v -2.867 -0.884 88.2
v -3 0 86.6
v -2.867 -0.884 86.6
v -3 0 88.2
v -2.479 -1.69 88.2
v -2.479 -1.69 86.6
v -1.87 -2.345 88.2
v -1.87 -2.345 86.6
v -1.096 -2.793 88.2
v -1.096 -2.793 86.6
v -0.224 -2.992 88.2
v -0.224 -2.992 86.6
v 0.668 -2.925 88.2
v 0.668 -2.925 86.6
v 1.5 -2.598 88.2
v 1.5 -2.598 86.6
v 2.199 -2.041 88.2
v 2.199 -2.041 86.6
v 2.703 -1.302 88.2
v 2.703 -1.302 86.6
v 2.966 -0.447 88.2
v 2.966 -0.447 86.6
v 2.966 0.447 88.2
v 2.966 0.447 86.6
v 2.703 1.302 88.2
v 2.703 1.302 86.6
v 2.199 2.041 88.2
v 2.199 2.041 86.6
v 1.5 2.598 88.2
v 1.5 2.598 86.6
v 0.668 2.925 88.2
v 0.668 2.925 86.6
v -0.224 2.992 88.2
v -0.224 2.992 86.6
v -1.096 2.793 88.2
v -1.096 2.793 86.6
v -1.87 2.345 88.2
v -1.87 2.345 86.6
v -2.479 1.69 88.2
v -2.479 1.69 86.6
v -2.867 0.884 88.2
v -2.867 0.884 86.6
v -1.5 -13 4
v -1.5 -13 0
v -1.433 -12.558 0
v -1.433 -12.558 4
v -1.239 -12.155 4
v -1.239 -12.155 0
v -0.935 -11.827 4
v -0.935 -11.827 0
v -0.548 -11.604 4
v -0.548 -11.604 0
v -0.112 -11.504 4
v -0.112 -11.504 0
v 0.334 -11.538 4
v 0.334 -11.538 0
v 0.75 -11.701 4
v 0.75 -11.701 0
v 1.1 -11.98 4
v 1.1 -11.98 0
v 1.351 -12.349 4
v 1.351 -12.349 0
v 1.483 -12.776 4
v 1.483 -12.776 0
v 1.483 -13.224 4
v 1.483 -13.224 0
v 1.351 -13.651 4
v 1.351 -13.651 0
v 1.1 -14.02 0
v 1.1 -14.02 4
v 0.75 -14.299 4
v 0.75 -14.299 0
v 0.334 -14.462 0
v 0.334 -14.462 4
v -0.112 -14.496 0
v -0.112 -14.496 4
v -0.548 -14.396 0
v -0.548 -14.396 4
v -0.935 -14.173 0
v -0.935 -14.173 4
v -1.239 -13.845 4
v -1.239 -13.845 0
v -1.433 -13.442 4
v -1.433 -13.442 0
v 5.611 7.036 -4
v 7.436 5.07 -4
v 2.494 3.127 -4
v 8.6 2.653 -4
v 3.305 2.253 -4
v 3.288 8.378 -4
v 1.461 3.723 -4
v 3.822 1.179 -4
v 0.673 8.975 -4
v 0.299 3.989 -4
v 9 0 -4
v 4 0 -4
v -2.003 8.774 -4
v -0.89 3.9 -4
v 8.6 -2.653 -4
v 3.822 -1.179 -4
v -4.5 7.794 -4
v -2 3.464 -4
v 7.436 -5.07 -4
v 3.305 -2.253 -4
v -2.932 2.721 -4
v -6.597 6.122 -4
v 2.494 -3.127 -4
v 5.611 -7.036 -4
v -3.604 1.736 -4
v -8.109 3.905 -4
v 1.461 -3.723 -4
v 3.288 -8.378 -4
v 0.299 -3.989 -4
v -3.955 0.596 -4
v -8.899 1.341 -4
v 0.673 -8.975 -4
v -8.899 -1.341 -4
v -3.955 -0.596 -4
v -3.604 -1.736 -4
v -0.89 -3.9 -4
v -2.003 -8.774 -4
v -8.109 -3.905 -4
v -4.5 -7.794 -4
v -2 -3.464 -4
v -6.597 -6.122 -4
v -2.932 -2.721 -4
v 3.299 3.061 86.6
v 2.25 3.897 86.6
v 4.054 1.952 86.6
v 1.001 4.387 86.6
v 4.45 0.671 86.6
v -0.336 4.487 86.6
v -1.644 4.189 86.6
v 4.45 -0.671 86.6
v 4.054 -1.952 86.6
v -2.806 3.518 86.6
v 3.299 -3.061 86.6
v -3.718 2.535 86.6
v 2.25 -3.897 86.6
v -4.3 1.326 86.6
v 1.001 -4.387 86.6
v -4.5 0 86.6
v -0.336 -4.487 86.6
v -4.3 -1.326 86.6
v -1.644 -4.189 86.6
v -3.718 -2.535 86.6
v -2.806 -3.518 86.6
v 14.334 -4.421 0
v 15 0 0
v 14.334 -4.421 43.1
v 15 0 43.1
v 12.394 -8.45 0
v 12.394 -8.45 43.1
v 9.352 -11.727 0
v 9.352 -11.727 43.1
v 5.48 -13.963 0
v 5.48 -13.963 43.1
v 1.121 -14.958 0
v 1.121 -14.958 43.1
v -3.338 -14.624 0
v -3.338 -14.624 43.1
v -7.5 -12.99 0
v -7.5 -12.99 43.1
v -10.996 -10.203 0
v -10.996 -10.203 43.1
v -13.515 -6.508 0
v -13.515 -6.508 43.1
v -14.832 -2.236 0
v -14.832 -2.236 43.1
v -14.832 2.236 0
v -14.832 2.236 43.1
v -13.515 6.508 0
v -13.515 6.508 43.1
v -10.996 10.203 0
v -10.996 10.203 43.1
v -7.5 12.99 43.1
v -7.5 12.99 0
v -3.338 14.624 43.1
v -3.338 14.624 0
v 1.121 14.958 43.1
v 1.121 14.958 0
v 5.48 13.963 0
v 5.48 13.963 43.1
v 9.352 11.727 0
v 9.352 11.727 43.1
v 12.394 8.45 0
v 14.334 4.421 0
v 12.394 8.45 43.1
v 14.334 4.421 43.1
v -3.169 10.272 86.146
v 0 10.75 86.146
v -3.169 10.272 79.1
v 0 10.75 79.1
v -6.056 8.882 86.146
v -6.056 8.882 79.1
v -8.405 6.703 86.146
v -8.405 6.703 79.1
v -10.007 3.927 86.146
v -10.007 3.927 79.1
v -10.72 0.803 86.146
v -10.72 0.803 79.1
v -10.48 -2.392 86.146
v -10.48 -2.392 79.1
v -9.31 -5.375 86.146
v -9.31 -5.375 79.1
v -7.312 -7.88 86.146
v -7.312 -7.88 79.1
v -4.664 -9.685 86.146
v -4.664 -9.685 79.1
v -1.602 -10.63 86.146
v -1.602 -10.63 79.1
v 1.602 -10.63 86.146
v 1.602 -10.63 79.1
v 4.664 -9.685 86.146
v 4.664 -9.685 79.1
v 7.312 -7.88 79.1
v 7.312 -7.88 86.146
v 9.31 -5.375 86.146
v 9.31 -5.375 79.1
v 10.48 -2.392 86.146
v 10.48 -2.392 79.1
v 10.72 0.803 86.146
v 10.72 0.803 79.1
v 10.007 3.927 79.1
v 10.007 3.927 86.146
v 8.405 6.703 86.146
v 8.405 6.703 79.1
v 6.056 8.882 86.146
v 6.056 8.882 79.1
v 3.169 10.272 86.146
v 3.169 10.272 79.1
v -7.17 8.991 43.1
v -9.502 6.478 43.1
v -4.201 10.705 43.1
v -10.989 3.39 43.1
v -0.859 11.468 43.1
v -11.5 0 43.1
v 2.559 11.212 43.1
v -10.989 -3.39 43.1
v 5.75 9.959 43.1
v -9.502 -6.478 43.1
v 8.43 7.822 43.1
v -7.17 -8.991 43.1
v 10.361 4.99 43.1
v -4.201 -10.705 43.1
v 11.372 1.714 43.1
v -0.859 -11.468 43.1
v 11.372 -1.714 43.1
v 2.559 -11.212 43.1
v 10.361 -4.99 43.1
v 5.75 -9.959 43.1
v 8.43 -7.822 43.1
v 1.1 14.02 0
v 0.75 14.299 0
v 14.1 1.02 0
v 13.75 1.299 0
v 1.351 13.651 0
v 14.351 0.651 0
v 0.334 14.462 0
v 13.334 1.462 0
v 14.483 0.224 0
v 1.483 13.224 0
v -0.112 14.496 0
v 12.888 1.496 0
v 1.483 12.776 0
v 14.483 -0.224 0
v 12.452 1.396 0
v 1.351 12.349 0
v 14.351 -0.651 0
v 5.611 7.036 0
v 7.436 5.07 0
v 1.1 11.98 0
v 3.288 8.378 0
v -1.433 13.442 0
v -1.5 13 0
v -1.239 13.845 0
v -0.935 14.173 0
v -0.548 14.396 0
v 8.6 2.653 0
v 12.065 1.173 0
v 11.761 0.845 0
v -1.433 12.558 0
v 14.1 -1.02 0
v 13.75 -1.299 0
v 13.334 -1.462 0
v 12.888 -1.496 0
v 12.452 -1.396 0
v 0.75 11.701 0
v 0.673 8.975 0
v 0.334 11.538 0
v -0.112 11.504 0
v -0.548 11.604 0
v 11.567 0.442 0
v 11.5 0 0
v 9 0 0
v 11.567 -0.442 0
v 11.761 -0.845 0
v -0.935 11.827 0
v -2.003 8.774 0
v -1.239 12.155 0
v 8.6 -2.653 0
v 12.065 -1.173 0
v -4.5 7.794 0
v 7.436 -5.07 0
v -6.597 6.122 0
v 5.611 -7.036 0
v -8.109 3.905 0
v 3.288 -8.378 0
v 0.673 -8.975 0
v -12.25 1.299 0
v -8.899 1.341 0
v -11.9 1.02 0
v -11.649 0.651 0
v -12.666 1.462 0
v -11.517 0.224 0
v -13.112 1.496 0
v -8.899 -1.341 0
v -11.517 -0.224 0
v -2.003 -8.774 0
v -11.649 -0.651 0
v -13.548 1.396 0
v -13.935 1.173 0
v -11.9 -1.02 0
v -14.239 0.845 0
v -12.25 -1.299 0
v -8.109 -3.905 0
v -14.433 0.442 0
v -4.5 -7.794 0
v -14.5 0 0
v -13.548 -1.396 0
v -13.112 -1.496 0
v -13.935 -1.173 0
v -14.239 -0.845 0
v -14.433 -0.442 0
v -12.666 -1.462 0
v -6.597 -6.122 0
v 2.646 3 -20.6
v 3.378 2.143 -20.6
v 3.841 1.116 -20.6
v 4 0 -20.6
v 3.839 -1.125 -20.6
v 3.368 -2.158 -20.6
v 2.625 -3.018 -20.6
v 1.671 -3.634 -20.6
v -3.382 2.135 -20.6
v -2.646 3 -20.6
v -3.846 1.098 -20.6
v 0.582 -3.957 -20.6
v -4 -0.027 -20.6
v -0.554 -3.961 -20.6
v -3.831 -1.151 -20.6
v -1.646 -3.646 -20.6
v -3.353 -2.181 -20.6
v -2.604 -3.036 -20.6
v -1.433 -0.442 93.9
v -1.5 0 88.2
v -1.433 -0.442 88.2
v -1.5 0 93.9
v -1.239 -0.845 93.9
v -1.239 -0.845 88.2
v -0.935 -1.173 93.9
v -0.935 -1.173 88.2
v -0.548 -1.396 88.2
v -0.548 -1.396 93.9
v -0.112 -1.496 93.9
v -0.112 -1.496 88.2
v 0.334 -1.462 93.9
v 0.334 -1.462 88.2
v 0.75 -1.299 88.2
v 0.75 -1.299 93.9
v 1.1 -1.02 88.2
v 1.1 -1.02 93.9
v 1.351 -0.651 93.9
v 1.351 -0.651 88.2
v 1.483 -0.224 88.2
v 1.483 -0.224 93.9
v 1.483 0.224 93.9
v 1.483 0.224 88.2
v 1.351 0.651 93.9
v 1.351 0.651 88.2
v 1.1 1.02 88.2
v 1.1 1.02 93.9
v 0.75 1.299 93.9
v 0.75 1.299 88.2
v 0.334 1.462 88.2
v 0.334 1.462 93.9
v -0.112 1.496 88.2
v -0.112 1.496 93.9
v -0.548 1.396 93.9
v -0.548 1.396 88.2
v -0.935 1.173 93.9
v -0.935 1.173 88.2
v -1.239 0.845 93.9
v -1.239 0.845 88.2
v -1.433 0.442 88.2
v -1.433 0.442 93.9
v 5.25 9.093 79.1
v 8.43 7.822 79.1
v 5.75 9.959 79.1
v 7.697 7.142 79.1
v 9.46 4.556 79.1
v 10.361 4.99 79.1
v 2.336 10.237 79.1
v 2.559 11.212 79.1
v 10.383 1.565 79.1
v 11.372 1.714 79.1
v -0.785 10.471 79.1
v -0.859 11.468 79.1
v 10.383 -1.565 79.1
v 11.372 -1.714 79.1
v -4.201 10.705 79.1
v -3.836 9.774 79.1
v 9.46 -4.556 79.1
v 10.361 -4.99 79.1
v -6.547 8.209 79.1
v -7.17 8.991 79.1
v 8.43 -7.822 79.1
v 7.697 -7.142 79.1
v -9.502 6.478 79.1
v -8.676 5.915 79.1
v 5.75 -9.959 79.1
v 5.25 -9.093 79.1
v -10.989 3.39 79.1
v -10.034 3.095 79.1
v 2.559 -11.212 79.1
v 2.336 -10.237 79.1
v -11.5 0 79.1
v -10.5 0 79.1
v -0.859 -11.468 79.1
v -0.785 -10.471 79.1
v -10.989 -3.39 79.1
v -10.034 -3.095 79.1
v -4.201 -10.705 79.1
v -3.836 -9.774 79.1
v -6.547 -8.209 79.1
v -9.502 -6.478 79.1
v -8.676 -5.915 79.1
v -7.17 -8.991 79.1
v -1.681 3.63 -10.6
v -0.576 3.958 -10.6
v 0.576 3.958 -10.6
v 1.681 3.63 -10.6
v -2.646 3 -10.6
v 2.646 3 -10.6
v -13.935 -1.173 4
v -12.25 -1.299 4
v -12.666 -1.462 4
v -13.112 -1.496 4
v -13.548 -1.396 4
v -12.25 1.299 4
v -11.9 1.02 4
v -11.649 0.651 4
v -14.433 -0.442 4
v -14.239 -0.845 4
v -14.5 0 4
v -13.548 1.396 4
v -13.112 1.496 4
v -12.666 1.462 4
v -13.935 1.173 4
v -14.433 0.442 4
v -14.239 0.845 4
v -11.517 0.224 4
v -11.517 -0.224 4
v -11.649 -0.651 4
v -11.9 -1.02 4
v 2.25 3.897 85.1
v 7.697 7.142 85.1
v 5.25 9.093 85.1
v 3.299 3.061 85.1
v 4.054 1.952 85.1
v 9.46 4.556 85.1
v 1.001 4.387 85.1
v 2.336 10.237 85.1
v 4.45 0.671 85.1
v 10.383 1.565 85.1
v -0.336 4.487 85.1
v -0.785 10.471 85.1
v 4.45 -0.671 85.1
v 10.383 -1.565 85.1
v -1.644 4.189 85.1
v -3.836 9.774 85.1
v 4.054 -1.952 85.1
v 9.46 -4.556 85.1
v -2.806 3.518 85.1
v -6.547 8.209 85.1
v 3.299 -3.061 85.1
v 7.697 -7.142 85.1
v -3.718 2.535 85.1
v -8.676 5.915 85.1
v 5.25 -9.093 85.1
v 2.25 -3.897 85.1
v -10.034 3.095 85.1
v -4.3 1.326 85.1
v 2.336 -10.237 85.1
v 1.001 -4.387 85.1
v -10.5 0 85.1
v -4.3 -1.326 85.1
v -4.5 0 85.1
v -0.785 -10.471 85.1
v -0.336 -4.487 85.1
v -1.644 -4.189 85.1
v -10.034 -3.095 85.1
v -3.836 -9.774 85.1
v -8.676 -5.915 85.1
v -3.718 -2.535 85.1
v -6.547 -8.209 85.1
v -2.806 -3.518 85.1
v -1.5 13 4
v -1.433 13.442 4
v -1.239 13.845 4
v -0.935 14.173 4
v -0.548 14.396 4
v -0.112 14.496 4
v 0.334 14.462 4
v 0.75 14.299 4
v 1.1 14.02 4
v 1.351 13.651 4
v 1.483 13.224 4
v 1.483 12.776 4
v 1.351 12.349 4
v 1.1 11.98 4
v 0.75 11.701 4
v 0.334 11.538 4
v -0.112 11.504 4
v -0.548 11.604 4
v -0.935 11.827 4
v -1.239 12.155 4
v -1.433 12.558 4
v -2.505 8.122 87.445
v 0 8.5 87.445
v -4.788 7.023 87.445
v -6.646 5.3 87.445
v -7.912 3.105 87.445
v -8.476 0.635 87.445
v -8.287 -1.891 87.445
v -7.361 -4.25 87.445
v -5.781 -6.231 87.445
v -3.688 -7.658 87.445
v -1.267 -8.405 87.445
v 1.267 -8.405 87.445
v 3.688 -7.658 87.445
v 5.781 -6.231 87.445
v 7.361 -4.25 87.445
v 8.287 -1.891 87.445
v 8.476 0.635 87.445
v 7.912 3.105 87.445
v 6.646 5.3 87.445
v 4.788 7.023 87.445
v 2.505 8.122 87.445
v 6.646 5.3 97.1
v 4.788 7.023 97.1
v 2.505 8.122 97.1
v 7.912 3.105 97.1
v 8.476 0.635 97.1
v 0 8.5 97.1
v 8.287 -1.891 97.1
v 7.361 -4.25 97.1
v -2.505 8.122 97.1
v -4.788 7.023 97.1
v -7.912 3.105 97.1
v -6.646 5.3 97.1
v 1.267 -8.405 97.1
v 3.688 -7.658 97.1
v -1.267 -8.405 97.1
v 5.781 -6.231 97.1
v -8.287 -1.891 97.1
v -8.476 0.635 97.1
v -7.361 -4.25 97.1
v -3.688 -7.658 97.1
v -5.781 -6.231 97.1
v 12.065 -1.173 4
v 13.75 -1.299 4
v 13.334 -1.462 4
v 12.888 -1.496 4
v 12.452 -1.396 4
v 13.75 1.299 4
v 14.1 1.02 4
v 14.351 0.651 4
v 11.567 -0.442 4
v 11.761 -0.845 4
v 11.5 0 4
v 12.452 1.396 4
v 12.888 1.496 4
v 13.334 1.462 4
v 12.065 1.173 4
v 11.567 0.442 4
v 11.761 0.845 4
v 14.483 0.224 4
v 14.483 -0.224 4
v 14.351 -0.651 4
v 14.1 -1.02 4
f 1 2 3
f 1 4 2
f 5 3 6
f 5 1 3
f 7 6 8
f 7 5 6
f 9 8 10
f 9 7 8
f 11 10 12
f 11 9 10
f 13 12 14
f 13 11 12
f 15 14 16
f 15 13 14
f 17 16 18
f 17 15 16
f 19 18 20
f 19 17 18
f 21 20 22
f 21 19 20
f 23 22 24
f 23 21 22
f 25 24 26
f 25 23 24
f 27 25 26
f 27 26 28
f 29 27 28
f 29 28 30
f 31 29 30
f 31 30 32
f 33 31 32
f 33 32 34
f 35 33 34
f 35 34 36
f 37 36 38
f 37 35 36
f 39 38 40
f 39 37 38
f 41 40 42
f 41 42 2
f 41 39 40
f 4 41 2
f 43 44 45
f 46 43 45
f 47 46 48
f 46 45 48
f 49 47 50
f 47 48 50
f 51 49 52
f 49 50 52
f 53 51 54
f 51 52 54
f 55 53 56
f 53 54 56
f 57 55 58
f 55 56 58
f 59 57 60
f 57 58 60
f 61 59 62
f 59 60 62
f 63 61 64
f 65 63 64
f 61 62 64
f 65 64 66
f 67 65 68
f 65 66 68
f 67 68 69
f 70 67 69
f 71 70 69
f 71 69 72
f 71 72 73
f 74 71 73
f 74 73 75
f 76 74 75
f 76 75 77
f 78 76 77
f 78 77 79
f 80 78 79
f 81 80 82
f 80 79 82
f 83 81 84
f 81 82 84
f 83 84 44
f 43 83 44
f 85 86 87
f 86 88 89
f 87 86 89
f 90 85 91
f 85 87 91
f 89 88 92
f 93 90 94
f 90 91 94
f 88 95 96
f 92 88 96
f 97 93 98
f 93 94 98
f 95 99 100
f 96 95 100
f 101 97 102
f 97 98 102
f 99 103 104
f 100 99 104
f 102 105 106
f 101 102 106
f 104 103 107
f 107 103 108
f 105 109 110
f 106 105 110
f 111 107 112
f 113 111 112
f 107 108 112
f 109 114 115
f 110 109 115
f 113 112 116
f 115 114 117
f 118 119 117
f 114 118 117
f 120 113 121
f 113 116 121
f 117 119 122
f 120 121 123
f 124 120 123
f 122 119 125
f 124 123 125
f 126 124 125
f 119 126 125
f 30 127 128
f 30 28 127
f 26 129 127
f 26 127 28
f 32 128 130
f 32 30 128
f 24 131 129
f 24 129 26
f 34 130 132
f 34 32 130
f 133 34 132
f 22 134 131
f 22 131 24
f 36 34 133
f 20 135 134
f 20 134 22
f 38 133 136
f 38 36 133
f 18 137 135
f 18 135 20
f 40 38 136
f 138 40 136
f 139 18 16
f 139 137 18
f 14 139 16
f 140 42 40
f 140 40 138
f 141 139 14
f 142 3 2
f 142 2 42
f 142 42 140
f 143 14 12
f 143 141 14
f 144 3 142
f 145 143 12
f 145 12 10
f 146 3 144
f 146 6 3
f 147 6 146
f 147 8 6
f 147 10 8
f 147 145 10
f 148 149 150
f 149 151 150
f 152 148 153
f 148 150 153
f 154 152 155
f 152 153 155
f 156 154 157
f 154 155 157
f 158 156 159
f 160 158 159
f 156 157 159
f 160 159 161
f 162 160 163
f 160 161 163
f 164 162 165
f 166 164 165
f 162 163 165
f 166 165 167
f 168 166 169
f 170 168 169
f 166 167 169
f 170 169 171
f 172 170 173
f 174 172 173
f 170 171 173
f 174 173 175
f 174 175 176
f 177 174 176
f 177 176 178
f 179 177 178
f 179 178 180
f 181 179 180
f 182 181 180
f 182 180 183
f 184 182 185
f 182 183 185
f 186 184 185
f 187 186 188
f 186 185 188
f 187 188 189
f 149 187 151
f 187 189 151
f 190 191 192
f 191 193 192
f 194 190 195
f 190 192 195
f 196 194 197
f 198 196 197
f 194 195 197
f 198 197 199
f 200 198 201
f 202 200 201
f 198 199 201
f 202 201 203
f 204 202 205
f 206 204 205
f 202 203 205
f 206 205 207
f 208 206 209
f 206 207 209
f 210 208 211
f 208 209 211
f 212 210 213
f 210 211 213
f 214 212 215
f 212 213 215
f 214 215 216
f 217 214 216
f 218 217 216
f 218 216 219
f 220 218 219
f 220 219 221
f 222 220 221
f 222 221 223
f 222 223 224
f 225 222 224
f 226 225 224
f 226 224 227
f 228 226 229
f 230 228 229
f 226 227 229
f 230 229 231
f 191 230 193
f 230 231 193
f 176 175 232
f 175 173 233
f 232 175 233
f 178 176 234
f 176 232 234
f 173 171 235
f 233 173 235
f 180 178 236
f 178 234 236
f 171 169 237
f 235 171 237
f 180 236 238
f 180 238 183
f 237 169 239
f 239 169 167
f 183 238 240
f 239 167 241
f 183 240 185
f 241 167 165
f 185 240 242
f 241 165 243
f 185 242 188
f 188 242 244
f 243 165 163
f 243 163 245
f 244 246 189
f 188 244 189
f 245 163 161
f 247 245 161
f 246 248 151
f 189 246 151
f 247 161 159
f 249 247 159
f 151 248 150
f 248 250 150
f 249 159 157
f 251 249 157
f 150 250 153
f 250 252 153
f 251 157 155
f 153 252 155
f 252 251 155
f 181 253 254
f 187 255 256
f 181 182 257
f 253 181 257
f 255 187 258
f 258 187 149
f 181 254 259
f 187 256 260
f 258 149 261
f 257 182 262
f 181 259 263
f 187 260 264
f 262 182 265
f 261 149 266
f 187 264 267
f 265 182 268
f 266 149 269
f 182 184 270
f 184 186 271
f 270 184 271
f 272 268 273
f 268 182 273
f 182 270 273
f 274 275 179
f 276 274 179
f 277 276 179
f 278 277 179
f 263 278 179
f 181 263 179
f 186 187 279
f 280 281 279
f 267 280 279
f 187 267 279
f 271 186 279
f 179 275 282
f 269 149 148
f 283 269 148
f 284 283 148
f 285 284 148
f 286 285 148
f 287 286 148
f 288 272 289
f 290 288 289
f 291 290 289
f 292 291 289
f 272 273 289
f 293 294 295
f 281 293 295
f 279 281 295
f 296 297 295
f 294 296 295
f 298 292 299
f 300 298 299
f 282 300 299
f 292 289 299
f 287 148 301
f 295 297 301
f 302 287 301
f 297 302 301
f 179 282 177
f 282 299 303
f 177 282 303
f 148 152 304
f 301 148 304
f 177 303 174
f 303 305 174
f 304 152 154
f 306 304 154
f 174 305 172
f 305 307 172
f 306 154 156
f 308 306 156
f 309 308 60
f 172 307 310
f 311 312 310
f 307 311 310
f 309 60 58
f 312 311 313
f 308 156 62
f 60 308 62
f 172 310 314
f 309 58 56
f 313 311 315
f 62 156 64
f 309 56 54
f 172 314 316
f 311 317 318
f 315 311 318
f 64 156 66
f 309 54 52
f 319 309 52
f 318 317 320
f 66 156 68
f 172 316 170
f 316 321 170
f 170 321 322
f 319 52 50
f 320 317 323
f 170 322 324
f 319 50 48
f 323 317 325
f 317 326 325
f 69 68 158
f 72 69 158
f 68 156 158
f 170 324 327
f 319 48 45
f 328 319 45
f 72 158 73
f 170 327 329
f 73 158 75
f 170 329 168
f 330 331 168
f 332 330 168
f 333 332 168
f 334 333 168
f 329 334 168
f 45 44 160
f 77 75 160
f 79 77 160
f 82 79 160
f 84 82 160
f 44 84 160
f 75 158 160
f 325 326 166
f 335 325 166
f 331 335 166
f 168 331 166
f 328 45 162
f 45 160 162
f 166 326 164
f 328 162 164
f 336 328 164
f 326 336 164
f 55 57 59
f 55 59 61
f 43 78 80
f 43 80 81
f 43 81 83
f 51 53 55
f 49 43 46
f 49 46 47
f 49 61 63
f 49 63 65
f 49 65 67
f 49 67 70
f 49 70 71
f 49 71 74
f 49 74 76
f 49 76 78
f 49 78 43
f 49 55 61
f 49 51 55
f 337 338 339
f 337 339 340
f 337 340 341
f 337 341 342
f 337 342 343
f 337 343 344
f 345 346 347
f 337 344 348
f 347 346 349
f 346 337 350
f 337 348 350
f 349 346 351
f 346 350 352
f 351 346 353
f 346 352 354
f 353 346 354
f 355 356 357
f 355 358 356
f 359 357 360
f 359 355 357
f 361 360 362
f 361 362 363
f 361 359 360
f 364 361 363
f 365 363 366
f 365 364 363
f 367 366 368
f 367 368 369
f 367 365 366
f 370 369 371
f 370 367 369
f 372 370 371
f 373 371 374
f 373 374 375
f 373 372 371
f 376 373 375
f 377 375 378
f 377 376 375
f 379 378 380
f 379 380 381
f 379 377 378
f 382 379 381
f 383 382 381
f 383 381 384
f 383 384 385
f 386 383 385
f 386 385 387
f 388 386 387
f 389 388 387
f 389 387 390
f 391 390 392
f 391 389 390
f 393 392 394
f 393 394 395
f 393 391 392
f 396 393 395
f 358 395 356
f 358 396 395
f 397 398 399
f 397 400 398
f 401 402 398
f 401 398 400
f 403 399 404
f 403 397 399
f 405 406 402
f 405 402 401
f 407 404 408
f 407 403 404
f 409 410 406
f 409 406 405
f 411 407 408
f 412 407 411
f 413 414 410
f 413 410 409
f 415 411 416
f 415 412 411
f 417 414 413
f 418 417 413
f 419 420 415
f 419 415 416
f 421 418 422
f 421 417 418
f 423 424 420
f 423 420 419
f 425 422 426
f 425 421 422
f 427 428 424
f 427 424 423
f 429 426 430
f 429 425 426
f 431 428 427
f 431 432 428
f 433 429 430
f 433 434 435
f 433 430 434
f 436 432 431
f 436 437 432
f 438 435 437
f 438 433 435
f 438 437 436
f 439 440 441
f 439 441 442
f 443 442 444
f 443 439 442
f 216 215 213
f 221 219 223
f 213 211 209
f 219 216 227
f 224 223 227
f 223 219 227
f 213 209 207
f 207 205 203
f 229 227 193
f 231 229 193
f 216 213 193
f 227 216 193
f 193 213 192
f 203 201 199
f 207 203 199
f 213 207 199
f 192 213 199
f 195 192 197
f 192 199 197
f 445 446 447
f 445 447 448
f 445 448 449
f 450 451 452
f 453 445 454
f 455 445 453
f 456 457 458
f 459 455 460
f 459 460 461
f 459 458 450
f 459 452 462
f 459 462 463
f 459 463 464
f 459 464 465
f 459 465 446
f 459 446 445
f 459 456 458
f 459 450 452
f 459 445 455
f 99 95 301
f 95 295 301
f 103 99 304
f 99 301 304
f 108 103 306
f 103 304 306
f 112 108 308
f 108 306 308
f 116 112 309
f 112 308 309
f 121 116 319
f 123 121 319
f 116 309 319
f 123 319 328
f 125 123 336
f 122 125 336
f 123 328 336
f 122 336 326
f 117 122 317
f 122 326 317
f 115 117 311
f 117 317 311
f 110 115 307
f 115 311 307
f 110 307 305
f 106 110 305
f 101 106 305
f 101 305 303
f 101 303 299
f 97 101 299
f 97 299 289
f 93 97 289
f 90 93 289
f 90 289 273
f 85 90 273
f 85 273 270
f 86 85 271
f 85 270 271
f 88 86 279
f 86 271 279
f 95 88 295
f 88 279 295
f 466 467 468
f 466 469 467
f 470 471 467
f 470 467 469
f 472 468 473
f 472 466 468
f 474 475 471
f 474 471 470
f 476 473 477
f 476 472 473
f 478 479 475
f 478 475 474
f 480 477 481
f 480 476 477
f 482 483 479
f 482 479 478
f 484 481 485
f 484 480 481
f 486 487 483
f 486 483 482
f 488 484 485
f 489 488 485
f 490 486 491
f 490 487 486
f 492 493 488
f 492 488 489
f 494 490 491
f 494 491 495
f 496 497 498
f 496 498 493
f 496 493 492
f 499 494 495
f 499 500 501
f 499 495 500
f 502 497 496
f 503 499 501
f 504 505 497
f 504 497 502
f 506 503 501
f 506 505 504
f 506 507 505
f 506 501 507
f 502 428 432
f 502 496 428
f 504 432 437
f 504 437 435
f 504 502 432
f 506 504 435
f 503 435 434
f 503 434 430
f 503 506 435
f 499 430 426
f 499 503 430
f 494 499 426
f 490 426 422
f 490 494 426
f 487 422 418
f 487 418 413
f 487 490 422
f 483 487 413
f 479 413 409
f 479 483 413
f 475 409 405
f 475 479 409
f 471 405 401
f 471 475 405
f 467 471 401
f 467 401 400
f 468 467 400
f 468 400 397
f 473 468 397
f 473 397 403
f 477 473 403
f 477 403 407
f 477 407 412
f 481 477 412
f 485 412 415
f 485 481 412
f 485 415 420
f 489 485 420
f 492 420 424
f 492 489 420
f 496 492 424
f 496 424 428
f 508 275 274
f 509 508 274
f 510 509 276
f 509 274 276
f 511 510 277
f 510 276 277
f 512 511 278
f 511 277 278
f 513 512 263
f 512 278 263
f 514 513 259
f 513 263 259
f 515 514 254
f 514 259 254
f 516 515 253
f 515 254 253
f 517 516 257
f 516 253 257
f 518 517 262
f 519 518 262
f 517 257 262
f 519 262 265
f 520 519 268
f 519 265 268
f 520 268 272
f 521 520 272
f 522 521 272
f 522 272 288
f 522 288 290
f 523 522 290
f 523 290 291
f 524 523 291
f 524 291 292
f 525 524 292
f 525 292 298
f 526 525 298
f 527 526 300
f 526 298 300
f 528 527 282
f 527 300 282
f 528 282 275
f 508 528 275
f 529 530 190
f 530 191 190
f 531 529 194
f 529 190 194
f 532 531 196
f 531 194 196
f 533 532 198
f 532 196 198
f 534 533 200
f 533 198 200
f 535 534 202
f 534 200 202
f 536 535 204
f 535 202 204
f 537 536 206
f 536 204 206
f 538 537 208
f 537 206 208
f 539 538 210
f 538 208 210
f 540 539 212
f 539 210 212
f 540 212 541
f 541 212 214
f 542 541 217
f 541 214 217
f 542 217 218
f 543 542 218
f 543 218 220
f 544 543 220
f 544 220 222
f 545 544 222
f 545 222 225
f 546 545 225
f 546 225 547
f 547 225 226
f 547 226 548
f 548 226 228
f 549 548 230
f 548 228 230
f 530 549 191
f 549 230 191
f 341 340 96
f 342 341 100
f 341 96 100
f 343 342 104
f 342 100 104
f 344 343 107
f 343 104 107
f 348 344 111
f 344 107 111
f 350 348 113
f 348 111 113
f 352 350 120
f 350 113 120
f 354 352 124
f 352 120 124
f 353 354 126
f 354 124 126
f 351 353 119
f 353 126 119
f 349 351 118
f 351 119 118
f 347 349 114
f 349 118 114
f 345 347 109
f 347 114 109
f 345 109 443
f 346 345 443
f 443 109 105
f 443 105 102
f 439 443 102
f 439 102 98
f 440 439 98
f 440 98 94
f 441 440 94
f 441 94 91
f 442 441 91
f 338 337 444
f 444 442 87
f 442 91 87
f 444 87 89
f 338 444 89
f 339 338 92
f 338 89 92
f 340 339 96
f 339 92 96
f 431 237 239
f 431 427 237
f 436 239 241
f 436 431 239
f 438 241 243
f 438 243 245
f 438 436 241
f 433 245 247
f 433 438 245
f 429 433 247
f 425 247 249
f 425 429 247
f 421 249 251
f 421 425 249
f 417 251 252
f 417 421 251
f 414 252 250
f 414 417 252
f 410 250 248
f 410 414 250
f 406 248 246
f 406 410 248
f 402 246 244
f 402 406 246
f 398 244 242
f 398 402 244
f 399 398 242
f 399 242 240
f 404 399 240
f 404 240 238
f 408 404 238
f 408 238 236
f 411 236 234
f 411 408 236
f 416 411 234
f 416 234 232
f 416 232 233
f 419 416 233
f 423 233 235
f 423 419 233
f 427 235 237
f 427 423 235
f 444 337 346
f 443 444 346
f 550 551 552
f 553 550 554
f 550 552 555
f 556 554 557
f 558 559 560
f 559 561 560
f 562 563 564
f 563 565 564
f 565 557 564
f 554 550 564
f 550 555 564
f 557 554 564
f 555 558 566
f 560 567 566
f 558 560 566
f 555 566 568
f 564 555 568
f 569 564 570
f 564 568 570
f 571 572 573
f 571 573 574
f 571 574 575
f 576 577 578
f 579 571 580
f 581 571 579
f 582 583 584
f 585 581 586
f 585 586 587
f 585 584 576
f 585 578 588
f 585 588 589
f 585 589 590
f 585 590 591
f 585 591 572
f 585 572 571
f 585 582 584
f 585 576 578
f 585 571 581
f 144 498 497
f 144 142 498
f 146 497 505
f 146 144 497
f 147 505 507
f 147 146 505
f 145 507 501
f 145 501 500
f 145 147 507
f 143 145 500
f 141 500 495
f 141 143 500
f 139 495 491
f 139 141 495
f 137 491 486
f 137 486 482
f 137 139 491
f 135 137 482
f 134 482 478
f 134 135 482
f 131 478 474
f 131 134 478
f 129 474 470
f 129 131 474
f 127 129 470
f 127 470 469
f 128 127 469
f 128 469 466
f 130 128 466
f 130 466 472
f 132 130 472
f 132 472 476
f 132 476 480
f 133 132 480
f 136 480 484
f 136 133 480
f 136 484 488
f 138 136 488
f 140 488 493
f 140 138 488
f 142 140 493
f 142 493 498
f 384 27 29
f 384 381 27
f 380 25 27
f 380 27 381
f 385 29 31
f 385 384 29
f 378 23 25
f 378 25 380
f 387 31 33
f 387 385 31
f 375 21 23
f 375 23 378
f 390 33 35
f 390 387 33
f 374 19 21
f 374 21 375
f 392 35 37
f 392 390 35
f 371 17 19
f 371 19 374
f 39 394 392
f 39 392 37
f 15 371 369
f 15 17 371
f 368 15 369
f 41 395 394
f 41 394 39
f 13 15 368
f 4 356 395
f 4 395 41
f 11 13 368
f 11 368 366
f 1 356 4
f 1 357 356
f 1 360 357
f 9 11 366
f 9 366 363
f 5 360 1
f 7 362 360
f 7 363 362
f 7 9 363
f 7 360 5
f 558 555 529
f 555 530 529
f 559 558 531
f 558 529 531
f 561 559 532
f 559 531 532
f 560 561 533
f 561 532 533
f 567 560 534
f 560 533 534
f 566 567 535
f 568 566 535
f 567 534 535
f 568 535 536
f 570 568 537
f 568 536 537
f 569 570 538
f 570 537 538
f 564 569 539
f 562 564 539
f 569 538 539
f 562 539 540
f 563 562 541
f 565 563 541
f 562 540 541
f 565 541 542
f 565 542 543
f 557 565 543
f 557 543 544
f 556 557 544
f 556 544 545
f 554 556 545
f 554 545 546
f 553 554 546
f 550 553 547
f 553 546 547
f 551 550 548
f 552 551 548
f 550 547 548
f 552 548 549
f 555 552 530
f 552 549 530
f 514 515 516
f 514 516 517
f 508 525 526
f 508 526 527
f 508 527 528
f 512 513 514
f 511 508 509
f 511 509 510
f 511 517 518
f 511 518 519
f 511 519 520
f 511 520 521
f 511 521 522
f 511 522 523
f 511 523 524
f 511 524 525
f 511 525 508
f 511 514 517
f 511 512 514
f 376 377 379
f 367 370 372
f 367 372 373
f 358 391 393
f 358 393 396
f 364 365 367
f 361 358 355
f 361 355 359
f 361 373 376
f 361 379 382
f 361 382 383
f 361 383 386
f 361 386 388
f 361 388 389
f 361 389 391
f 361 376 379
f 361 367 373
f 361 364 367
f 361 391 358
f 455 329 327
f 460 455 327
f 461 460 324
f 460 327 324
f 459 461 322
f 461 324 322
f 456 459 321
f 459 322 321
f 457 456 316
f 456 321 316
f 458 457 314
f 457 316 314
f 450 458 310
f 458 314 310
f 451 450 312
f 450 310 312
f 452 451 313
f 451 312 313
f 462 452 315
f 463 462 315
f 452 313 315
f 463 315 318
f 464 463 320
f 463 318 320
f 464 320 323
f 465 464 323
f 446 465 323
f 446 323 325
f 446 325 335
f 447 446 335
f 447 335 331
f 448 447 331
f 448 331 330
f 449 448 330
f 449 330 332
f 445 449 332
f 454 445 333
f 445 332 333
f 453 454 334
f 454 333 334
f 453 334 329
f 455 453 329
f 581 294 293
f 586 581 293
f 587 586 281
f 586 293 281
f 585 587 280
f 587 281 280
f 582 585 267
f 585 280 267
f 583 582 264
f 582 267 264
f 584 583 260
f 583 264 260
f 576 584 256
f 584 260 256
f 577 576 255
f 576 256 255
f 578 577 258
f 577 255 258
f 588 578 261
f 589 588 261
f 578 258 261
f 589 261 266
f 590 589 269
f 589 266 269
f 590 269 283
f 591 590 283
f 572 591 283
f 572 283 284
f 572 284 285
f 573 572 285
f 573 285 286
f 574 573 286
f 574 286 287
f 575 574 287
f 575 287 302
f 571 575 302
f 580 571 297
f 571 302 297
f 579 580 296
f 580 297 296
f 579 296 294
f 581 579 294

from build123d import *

# Parameters (mm, degrees)
CUT_EXTRUDE1_START = -10
CUT_EXTRUDE1_DEPTH = 10
SKETCH5_R          = 1.5
CUT_EXTRUDE2_DEPTH = 4


with BuildPart() as part:
    # Sketch1 → Revolve1 (revolve)
    with BuildSketch(Plane(origin=(0, 0, 0), x_dir=(0, 0, -1), z_dir=(1, 0, 0)), mode=Mode.PRIVATE) as revolve1_sk:
        Polygon((20.6, 0), (20.6, 4), (4, 4), (4, 9), (0, 9), (0, 15), (-43.1, 15), (-43.1, 0), align=None)
    revolve(revolve1_sk.sketch.rotate(Axis((0, 0, 0), (0, 0, -1)), 90), axis=Axis((0, 0, 0), (0, 0, -1)))

    # Sketch2 → Cut-Extrude1 (cut)
    with BuildSketch(Plane(origin=(0, 0, -20.6), x_dir=(-1, 0, 0), z_dir=(0, 0, -1)).offset(CUT_EXTRUDE1_START)):
        with BuildLine():
            Line((-2.645751311, 3), (2.645751311, 3))
            ThreePointArc((2.645751311, 3), (0, 4), (-2.645751311, 3))
        make_face()
    extrude(amount=CUT_EXTRUDE1_DEPTH, mode=Mode.SUBTRACT)

    # Sketch3 → Revolve2 (revolve)
    with BuildSketch(Plane(origin=(0, 0, 0), x_dir=(0, 0, -1), z_dir=(1, 0, 0)), mode=Mode.PRIVATE) as revolve2_sk:
        Polygon((-43.1, 11.5), (-79.1, 11.5), (-79.1, 10.5), (-85.1, 10.5), (-85.1, 4.5), (-86.6, 4.5), (-86.6, 3), (-88.2, 3), (-88.2, 1.5), (-93.9, 1.5), (-93.9, 0), (-43.1, 0), align=None)
    revolve(revolve2_sk.sketch.rotate(Axis((0, 0, 0), (0, 0, 1)), 90), axis=Axis((0, 0, 0), (0, 0, 1)))

    # Sketch5 → Cut-Extrude2 (cut)
    with BuildSketch(Plane(origin=(0, 0, 0), x_dir=(-1, 0, 0), z_dir=(0, 0, -1))):
        with Locations((0, 13)):
            Circle(SKETCH5_R)
        with Locations((13, 0)):
            Circle(SKETCH5_R)
        with Locations((0, -13)):
            Circle(SKETCH5_R)
        with Locations((-13, 0)):
            Circle(SKETCH5_R)
    extrude(amount=-CUT_EXTRUDE2_DEPTH, mode=Mode.SUBTRACT)


with BuildPart() as body_2:
    # Sketch4 → Revolve3 (revolve)
    with BuildSketch(Plane(origin=(0, 0, 0), x_dir=(0, 0, -1), z_dir=(1, 0, 0))):
        Polygon((-86.146092564, 10.75), (-79.1, 10.75), (-79.1, 0), (-97.1, 0), (-97.1, 8.5), (-87.44513067, 8.5), align=None)
    revolve(axis=Axis((0, 0, 79.1), (0, 0, 1)))


solid = Compound([part.part, body_2.part])
